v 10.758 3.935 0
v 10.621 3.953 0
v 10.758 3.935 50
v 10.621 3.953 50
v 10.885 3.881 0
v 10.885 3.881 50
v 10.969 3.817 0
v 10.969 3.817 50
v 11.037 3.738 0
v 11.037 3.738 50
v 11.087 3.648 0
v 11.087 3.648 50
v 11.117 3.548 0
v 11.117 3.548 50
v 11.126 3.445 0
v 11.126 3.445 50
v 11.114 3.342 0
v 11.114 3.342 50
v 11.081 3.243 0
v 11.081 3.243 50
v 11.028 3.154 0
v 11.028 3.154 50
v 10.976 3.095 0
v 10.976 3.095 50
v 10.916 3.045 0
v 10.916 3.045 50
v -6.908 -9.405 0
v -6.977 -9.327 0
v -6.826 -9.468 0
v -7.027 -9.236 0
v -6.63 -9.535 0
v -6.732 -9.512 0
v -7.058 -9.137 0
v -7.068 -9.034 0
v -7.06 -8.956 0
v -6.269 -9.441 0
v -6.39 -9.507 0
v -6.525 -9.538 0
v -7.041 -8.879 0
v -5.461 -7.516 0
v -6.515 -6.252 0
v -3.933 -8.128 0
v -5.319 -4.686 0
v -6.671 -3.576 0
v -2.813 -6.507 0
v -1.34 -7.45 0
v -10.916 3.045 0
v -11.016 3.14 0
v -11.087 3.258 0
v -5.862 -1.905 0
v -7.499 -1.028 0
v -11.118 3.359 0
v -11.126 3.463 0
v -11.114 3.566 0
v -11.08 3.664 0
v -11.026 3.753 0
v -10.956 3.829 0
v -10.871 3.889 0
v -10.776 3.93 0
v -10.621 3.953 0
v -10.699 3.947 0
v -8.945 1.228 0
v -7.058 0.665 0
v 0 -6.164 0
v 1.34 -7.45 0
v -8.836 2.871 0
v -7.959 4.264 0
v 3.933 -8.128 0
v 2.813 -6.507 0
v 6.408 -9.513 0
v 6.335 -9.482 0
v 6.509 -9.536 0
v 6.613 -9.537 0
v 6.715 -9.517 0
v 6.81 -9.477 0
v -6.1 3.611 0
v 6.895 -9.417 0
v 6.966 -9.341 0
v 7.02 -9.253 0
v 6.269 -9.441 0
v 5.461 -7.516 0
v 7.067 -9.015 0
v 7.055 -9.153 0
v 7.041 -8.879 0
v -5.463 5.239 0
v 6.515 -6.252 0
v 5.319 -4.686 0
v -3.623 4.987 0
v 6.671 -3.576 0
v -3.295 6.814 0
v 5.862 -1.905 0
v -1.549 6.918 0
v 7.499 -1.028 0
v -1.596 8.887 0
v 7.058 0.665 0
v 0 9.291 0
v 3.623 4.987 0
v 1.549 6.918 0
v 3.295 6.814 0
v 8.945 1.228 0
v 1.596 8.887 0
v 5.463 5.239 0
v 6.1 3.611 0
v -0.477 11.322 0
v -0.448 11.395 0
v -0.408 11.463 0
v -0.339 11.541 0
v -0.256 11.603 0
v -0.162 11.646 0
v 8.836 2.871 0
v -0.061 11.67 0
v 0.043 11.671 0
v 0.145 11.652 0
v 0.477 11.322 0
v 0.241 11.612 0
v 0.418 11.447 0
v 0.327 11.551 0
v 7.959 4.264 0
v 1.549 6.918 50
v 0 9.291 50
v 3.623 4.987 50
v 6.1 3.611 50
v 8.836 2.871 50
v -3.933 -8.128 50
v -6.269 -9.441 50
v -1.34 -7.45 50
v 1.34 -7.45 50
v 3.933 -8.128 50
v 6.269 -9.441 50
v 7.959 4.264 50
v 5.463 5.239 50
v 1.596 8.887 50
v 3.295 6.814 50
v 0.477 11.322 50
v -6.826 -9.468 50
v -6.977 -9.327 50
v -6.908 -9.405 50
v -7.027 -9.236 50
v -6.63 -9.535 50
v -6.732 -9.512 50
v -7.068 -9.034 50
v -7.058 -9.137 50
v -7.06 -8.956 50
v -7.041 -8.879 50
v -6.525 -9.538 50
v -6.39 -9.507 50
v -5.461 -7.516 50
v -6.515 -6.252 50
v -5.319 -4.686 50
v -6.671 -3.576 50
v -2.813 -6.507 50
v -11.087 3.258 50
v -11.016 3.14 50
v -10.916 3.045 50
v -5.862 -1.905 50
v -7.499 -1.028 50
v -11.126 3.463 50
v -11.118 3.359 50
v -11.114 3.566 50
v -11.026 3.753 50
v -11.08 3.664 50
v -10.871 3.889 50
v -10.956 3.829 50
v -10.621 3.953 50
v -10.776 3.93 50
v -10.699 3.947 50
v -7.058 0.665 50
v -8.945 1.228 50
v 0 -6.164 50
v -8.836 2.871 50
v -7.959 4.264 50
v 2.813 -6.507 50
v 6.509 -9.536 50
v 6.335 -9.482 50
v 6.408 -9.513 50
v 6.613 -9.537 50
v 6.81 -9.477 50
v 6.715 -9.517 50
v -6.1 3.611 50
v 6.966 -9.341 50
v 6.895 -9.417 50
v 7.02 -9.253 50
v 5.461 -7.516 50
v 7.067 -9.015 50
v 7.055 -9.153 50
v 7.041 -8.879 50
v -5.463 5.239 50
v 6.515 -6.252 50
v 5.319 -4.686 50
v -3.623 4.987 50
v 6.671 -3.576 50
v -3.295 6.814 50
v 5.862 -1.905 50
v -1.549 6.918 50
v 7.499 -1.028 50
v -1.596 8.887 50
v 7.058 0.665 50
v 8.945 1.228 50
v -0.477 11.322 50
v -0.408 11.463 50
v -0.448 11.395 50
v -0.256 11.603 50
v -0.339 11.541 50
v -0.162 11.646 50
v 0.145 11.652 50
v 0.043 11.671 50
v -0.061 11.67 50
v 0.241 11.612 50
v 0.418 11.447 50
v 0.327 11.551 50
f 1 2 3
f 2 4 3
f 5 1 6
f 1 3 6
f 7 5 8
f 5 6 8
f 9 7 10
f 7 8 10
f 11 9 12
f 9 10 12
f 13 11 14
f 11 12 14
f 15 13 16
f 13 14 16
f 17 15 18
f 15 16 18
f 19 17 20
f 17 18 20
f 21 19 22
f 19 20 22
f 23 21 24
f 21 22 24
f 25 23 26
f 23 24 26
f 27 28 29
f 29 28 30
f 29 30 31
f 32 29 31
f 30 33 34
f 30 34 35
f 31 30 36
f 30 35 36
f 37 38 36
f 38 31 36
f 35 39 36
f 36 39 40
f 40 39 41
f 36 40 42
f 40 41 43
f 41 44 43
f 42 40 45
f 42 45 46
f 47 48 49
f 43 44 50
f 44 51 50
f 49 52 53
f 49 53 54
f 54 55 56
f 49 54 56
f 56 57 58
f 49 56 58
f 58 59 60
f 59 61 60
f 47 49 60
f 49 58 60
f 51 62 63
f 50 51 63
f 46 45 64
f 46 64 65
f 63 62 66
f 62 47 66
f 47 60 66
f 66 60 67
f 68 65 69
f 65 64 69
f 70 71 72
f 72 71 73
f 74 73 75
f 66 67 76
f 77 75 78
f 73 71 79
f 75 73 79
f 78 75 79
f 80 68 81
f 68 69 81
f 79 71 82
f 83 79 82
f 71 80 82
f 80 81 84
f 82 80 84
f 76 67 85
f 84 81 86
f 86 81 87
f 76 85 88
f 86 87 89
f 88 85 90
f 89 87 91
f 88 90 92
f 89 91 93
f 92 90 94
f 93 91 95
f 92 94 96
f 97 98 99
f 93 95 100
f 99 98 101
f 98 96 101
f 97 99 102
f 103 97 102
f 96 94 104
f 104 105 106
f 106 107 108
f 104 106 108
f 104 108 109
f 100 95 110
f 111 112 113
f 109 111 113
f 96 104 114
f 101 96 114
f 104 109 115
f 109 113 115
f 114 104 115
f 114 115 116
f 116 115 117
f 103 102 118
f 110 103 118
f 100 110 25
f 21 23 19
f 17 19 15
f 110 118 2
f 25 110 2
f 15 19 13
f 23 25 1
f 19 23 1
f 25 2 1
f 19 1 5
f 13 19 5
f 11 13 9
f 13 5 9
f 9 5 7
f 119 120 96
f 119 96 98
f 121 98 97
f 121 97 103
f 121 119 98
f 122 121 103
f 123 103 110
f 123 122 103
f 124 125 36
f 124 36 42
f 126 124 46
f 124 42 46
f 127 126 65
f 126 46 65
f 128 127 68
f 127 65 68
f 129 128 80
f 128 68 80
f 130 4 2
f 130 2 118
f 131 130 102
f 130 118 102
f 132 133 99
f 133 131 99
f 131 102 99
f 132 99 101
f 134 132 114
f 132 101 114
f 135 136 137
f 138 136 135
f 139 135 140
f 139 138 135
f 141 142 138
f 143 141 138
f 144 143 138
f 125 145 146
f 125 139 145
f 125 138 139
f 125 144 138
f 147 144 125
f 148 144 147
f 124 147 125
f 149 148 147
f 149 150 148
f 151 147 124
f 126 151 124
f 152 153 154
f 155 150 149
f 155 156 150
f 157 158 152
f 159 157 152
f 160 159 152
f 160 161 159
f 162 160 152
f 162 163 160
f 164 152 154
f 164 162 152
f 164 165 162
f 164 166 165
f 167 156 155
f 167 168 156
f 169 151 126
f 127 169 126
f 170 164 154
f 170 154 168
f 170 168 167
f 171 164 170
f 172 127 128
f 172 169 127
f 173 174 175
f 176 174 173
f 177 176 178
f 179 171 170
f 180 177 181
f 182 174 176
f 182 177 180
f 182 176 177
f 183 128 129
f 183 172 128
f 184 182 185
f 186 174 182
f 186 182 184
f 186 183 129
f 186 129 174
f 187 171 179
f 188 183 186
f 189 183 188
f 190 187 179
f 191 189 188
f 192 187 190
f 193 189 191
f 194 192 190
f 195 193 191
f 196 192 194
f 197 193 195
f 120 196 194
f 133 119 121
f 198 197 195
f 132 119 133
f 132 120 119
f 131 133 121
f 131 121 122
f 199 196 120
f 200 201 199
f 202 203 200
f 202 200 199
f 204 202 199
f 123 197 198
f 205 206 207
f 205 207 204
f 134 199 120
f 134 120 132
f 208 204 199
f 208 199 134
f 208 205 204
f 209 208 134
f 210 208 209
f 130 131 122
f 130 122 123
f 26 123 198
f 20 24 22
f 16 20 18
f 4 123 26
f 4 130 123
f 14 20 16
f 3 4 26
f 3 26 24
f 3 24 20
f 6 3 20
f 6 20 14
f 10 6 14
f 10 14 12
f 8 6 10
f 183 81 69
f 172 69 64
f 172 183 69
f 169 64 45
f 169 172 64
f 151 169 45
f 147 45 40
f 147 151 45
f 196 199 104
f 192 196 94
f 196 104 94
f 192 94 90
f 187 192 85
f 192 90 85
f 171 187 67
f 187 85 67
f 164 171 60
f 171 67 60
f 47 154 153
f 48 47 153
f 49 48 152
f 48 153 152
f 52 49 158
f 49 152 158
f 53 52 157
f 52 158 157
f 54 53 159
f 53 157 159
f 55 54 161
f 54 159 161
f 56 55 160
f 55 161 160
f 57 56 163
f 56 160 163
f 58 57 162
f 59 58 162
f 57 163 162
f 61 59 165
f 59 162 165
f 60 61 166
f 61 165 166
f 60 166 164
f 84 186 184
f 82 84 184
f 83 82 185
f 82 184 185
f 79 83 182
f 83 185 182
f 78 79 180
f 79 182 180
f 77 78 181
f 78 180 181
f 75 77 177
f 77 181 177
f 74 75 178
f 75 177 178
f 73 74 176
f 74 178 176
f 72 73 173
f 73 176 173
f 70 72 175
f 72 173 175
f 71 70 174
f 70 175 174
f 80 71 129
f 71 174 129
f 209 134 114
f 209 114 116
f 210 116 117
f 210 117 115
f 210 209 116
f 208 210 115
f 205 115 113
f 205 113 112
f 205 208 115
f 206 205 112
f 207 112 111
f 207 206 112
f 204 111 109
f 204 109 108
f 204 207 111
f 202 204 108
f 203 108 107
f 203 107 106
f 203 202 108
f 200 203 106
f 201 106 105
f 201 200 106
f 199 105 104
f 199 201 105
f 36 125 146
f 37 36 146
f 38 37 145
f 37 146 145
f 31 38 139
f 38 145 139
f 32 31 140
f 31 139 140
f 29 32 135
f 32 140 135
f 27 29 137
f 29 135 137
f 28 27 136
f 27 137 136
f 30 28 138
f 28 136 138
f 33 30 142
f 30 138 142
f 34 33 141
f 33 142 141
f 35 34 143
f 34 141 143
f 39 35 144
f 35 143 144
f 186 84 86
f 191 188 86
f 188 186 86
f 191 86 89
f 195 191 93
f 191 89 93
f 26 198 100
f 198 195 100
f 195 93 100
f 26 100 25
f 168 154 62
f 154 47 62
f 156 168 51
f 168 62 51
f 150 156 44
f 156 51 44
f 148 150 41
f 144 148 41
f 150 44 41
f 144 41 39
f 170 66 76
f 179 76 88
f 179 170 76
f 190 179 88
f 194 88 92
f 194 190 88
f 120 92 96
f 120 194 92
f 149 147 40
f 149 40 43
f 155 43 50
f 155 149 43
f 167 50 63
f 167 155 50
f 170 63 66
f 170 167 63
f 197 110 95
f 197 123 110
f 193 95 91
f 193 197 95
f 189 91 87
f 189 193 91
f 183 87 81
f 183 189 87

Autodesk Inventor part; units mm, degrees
ref_plane "YZ Plane" through (0, 0, 0) normal (1, 0, 0) x (0, 1, 0)
ref_plane "XZ Plane" through (0, 0, 0) normal (0, 1, 0) x (-1, 0, 0)
ref_plane "XY Plane" through (0, 0, 0) normal (0, 0, 1) x (1, 0, 0)
sketch "Skizze1" plane through (0, 0, 0) normal (0, 0, 1) x (1, 0, 0)
  circle A0 centre (-10.5, 14.452) radius 10.5
  circle A1 centre (0, 0) radius 17.8637 construction
  circle A2 centre (10.5, 14.452) radius 10.5
  circle A3 centre (16.9894, -5.5202) radius 10.5
  circle A4 centre (0, -17.8637) radius 10.5
  circle A5 centre (-16.9894, -5.5202) radius 10.5
  arc A6 (-13.7447, 4.4659) -> (0, 14.452) centre (-10.5, 14.452) ccw
  arc A7 (0, 14.452) -> (13.7447, 4.4659) centre (10.5, 14.452) ccw
  arc A8 (13.7447, 4.4659) -> (8.4947, -11.6919) centre (16.9894, -5.5202) ccw
  arc A9 (8.4947, -11.6919) -> (-8.4947, -11.6919) centre (0, -17.8637) ccw
  arc A10 (-8.4947, -11.6919) -> (-13.7447, 4.4659) centre (-16.9894, -5.5202) ccw
  dimension "d0" = 21
  dimension "d1" = 10.5
extrude "Extrusion1" add sketch "Skizze1" along normal blind 50 contours A2 A3 A4 A5 A0
fillet "Rundung1" radius 0.5 5 edges at (0, 14.452, 25) (13.7447, 4.4659, 25) (-13.7447, 4.4659, 25) (-8.4947, -11.6919, 25) (8.4947, -11.6919, 25)
sketch "Skizze2" plane through (0, 0, 50) normal (0, 0, 1) x (1, 0, 0)
  arc A0 (6.269, -9.4405) -> (7.0412, -8.8794) centre (6.5675, -9.0394) ccw projected
  arc A1 (10.9157, 3.0449) -> (7.0412, -8.8794) centre (16.9894, -5.5202) ccw projected
  arc A2 (10.9157, 3.0449) -> (10.6207, 3.9527) centre (10.6264, 3.4527) ccw projected
  arc A3 (0.4773, 11.3223) -> (10.6207, 3.9527) centre (10.5, 14.452) ccw projected
  arc A4 (0.4773, 11.3223) -> (-0.4773, 11.3223) centre (0, 11.1733) ccw projected
  arc A5 (-10.6207, 3.9527) -> (-0.4773, 11.3223) centre (-10.5, 14.452) ccw projected
  arc A6 (-10.6207, 3.9527) -> (-10.9157, 3.0449) centre (-10.6264, 3.4527) ccw projected
  arc A7 (-7.0412, -8.8794) -> (-10.9157, 3.0449) centre (-16.9894, -5.5202) ccw projected
  arc A8 (-7.0412, -8.8794) -> (-6.269, -9.4405) centre (-6.5675, -9.0394) ccw projected
  arc A9 (6.269, -9.4405) -> (-6.269, -9.4405) centre (0, -17.8637) ccw projected
  arc A10 (8.8359, 2.871) -> (5.4609, -7.5163) centre (16.9894, -5.5202) ccw
  arc A11 (5.4609, -7.5163) -> (-5.4609, -7.5163) centre (0, -17.8637) ccw
  arc A12 (-5.4609, -7.5163) -> (-8.8359, 2.871) centre (-16.9894, -5.5202) ccw
  arc A13 (-8.8359, 2.871) -> (0, 9.2906) centre (-10.5, 14.452) ccw
  arc A14 (0, 9.2906) -> (8.8359, 2.871) centre (10.5, 14.452) ccw
  point P0 (0, 0)
  dimension "d5" = 1.2
extrude "Extrusion2" cut sketch "Skizze2" against normal through all contours A10 A11 A12 A13 A14
equation "\"G_L\" = 0"
equation "\"G_H\" = 0"
equation "\"G_B\" = 0"
properties part number "21700_stern" material "GEDA Stahl"
